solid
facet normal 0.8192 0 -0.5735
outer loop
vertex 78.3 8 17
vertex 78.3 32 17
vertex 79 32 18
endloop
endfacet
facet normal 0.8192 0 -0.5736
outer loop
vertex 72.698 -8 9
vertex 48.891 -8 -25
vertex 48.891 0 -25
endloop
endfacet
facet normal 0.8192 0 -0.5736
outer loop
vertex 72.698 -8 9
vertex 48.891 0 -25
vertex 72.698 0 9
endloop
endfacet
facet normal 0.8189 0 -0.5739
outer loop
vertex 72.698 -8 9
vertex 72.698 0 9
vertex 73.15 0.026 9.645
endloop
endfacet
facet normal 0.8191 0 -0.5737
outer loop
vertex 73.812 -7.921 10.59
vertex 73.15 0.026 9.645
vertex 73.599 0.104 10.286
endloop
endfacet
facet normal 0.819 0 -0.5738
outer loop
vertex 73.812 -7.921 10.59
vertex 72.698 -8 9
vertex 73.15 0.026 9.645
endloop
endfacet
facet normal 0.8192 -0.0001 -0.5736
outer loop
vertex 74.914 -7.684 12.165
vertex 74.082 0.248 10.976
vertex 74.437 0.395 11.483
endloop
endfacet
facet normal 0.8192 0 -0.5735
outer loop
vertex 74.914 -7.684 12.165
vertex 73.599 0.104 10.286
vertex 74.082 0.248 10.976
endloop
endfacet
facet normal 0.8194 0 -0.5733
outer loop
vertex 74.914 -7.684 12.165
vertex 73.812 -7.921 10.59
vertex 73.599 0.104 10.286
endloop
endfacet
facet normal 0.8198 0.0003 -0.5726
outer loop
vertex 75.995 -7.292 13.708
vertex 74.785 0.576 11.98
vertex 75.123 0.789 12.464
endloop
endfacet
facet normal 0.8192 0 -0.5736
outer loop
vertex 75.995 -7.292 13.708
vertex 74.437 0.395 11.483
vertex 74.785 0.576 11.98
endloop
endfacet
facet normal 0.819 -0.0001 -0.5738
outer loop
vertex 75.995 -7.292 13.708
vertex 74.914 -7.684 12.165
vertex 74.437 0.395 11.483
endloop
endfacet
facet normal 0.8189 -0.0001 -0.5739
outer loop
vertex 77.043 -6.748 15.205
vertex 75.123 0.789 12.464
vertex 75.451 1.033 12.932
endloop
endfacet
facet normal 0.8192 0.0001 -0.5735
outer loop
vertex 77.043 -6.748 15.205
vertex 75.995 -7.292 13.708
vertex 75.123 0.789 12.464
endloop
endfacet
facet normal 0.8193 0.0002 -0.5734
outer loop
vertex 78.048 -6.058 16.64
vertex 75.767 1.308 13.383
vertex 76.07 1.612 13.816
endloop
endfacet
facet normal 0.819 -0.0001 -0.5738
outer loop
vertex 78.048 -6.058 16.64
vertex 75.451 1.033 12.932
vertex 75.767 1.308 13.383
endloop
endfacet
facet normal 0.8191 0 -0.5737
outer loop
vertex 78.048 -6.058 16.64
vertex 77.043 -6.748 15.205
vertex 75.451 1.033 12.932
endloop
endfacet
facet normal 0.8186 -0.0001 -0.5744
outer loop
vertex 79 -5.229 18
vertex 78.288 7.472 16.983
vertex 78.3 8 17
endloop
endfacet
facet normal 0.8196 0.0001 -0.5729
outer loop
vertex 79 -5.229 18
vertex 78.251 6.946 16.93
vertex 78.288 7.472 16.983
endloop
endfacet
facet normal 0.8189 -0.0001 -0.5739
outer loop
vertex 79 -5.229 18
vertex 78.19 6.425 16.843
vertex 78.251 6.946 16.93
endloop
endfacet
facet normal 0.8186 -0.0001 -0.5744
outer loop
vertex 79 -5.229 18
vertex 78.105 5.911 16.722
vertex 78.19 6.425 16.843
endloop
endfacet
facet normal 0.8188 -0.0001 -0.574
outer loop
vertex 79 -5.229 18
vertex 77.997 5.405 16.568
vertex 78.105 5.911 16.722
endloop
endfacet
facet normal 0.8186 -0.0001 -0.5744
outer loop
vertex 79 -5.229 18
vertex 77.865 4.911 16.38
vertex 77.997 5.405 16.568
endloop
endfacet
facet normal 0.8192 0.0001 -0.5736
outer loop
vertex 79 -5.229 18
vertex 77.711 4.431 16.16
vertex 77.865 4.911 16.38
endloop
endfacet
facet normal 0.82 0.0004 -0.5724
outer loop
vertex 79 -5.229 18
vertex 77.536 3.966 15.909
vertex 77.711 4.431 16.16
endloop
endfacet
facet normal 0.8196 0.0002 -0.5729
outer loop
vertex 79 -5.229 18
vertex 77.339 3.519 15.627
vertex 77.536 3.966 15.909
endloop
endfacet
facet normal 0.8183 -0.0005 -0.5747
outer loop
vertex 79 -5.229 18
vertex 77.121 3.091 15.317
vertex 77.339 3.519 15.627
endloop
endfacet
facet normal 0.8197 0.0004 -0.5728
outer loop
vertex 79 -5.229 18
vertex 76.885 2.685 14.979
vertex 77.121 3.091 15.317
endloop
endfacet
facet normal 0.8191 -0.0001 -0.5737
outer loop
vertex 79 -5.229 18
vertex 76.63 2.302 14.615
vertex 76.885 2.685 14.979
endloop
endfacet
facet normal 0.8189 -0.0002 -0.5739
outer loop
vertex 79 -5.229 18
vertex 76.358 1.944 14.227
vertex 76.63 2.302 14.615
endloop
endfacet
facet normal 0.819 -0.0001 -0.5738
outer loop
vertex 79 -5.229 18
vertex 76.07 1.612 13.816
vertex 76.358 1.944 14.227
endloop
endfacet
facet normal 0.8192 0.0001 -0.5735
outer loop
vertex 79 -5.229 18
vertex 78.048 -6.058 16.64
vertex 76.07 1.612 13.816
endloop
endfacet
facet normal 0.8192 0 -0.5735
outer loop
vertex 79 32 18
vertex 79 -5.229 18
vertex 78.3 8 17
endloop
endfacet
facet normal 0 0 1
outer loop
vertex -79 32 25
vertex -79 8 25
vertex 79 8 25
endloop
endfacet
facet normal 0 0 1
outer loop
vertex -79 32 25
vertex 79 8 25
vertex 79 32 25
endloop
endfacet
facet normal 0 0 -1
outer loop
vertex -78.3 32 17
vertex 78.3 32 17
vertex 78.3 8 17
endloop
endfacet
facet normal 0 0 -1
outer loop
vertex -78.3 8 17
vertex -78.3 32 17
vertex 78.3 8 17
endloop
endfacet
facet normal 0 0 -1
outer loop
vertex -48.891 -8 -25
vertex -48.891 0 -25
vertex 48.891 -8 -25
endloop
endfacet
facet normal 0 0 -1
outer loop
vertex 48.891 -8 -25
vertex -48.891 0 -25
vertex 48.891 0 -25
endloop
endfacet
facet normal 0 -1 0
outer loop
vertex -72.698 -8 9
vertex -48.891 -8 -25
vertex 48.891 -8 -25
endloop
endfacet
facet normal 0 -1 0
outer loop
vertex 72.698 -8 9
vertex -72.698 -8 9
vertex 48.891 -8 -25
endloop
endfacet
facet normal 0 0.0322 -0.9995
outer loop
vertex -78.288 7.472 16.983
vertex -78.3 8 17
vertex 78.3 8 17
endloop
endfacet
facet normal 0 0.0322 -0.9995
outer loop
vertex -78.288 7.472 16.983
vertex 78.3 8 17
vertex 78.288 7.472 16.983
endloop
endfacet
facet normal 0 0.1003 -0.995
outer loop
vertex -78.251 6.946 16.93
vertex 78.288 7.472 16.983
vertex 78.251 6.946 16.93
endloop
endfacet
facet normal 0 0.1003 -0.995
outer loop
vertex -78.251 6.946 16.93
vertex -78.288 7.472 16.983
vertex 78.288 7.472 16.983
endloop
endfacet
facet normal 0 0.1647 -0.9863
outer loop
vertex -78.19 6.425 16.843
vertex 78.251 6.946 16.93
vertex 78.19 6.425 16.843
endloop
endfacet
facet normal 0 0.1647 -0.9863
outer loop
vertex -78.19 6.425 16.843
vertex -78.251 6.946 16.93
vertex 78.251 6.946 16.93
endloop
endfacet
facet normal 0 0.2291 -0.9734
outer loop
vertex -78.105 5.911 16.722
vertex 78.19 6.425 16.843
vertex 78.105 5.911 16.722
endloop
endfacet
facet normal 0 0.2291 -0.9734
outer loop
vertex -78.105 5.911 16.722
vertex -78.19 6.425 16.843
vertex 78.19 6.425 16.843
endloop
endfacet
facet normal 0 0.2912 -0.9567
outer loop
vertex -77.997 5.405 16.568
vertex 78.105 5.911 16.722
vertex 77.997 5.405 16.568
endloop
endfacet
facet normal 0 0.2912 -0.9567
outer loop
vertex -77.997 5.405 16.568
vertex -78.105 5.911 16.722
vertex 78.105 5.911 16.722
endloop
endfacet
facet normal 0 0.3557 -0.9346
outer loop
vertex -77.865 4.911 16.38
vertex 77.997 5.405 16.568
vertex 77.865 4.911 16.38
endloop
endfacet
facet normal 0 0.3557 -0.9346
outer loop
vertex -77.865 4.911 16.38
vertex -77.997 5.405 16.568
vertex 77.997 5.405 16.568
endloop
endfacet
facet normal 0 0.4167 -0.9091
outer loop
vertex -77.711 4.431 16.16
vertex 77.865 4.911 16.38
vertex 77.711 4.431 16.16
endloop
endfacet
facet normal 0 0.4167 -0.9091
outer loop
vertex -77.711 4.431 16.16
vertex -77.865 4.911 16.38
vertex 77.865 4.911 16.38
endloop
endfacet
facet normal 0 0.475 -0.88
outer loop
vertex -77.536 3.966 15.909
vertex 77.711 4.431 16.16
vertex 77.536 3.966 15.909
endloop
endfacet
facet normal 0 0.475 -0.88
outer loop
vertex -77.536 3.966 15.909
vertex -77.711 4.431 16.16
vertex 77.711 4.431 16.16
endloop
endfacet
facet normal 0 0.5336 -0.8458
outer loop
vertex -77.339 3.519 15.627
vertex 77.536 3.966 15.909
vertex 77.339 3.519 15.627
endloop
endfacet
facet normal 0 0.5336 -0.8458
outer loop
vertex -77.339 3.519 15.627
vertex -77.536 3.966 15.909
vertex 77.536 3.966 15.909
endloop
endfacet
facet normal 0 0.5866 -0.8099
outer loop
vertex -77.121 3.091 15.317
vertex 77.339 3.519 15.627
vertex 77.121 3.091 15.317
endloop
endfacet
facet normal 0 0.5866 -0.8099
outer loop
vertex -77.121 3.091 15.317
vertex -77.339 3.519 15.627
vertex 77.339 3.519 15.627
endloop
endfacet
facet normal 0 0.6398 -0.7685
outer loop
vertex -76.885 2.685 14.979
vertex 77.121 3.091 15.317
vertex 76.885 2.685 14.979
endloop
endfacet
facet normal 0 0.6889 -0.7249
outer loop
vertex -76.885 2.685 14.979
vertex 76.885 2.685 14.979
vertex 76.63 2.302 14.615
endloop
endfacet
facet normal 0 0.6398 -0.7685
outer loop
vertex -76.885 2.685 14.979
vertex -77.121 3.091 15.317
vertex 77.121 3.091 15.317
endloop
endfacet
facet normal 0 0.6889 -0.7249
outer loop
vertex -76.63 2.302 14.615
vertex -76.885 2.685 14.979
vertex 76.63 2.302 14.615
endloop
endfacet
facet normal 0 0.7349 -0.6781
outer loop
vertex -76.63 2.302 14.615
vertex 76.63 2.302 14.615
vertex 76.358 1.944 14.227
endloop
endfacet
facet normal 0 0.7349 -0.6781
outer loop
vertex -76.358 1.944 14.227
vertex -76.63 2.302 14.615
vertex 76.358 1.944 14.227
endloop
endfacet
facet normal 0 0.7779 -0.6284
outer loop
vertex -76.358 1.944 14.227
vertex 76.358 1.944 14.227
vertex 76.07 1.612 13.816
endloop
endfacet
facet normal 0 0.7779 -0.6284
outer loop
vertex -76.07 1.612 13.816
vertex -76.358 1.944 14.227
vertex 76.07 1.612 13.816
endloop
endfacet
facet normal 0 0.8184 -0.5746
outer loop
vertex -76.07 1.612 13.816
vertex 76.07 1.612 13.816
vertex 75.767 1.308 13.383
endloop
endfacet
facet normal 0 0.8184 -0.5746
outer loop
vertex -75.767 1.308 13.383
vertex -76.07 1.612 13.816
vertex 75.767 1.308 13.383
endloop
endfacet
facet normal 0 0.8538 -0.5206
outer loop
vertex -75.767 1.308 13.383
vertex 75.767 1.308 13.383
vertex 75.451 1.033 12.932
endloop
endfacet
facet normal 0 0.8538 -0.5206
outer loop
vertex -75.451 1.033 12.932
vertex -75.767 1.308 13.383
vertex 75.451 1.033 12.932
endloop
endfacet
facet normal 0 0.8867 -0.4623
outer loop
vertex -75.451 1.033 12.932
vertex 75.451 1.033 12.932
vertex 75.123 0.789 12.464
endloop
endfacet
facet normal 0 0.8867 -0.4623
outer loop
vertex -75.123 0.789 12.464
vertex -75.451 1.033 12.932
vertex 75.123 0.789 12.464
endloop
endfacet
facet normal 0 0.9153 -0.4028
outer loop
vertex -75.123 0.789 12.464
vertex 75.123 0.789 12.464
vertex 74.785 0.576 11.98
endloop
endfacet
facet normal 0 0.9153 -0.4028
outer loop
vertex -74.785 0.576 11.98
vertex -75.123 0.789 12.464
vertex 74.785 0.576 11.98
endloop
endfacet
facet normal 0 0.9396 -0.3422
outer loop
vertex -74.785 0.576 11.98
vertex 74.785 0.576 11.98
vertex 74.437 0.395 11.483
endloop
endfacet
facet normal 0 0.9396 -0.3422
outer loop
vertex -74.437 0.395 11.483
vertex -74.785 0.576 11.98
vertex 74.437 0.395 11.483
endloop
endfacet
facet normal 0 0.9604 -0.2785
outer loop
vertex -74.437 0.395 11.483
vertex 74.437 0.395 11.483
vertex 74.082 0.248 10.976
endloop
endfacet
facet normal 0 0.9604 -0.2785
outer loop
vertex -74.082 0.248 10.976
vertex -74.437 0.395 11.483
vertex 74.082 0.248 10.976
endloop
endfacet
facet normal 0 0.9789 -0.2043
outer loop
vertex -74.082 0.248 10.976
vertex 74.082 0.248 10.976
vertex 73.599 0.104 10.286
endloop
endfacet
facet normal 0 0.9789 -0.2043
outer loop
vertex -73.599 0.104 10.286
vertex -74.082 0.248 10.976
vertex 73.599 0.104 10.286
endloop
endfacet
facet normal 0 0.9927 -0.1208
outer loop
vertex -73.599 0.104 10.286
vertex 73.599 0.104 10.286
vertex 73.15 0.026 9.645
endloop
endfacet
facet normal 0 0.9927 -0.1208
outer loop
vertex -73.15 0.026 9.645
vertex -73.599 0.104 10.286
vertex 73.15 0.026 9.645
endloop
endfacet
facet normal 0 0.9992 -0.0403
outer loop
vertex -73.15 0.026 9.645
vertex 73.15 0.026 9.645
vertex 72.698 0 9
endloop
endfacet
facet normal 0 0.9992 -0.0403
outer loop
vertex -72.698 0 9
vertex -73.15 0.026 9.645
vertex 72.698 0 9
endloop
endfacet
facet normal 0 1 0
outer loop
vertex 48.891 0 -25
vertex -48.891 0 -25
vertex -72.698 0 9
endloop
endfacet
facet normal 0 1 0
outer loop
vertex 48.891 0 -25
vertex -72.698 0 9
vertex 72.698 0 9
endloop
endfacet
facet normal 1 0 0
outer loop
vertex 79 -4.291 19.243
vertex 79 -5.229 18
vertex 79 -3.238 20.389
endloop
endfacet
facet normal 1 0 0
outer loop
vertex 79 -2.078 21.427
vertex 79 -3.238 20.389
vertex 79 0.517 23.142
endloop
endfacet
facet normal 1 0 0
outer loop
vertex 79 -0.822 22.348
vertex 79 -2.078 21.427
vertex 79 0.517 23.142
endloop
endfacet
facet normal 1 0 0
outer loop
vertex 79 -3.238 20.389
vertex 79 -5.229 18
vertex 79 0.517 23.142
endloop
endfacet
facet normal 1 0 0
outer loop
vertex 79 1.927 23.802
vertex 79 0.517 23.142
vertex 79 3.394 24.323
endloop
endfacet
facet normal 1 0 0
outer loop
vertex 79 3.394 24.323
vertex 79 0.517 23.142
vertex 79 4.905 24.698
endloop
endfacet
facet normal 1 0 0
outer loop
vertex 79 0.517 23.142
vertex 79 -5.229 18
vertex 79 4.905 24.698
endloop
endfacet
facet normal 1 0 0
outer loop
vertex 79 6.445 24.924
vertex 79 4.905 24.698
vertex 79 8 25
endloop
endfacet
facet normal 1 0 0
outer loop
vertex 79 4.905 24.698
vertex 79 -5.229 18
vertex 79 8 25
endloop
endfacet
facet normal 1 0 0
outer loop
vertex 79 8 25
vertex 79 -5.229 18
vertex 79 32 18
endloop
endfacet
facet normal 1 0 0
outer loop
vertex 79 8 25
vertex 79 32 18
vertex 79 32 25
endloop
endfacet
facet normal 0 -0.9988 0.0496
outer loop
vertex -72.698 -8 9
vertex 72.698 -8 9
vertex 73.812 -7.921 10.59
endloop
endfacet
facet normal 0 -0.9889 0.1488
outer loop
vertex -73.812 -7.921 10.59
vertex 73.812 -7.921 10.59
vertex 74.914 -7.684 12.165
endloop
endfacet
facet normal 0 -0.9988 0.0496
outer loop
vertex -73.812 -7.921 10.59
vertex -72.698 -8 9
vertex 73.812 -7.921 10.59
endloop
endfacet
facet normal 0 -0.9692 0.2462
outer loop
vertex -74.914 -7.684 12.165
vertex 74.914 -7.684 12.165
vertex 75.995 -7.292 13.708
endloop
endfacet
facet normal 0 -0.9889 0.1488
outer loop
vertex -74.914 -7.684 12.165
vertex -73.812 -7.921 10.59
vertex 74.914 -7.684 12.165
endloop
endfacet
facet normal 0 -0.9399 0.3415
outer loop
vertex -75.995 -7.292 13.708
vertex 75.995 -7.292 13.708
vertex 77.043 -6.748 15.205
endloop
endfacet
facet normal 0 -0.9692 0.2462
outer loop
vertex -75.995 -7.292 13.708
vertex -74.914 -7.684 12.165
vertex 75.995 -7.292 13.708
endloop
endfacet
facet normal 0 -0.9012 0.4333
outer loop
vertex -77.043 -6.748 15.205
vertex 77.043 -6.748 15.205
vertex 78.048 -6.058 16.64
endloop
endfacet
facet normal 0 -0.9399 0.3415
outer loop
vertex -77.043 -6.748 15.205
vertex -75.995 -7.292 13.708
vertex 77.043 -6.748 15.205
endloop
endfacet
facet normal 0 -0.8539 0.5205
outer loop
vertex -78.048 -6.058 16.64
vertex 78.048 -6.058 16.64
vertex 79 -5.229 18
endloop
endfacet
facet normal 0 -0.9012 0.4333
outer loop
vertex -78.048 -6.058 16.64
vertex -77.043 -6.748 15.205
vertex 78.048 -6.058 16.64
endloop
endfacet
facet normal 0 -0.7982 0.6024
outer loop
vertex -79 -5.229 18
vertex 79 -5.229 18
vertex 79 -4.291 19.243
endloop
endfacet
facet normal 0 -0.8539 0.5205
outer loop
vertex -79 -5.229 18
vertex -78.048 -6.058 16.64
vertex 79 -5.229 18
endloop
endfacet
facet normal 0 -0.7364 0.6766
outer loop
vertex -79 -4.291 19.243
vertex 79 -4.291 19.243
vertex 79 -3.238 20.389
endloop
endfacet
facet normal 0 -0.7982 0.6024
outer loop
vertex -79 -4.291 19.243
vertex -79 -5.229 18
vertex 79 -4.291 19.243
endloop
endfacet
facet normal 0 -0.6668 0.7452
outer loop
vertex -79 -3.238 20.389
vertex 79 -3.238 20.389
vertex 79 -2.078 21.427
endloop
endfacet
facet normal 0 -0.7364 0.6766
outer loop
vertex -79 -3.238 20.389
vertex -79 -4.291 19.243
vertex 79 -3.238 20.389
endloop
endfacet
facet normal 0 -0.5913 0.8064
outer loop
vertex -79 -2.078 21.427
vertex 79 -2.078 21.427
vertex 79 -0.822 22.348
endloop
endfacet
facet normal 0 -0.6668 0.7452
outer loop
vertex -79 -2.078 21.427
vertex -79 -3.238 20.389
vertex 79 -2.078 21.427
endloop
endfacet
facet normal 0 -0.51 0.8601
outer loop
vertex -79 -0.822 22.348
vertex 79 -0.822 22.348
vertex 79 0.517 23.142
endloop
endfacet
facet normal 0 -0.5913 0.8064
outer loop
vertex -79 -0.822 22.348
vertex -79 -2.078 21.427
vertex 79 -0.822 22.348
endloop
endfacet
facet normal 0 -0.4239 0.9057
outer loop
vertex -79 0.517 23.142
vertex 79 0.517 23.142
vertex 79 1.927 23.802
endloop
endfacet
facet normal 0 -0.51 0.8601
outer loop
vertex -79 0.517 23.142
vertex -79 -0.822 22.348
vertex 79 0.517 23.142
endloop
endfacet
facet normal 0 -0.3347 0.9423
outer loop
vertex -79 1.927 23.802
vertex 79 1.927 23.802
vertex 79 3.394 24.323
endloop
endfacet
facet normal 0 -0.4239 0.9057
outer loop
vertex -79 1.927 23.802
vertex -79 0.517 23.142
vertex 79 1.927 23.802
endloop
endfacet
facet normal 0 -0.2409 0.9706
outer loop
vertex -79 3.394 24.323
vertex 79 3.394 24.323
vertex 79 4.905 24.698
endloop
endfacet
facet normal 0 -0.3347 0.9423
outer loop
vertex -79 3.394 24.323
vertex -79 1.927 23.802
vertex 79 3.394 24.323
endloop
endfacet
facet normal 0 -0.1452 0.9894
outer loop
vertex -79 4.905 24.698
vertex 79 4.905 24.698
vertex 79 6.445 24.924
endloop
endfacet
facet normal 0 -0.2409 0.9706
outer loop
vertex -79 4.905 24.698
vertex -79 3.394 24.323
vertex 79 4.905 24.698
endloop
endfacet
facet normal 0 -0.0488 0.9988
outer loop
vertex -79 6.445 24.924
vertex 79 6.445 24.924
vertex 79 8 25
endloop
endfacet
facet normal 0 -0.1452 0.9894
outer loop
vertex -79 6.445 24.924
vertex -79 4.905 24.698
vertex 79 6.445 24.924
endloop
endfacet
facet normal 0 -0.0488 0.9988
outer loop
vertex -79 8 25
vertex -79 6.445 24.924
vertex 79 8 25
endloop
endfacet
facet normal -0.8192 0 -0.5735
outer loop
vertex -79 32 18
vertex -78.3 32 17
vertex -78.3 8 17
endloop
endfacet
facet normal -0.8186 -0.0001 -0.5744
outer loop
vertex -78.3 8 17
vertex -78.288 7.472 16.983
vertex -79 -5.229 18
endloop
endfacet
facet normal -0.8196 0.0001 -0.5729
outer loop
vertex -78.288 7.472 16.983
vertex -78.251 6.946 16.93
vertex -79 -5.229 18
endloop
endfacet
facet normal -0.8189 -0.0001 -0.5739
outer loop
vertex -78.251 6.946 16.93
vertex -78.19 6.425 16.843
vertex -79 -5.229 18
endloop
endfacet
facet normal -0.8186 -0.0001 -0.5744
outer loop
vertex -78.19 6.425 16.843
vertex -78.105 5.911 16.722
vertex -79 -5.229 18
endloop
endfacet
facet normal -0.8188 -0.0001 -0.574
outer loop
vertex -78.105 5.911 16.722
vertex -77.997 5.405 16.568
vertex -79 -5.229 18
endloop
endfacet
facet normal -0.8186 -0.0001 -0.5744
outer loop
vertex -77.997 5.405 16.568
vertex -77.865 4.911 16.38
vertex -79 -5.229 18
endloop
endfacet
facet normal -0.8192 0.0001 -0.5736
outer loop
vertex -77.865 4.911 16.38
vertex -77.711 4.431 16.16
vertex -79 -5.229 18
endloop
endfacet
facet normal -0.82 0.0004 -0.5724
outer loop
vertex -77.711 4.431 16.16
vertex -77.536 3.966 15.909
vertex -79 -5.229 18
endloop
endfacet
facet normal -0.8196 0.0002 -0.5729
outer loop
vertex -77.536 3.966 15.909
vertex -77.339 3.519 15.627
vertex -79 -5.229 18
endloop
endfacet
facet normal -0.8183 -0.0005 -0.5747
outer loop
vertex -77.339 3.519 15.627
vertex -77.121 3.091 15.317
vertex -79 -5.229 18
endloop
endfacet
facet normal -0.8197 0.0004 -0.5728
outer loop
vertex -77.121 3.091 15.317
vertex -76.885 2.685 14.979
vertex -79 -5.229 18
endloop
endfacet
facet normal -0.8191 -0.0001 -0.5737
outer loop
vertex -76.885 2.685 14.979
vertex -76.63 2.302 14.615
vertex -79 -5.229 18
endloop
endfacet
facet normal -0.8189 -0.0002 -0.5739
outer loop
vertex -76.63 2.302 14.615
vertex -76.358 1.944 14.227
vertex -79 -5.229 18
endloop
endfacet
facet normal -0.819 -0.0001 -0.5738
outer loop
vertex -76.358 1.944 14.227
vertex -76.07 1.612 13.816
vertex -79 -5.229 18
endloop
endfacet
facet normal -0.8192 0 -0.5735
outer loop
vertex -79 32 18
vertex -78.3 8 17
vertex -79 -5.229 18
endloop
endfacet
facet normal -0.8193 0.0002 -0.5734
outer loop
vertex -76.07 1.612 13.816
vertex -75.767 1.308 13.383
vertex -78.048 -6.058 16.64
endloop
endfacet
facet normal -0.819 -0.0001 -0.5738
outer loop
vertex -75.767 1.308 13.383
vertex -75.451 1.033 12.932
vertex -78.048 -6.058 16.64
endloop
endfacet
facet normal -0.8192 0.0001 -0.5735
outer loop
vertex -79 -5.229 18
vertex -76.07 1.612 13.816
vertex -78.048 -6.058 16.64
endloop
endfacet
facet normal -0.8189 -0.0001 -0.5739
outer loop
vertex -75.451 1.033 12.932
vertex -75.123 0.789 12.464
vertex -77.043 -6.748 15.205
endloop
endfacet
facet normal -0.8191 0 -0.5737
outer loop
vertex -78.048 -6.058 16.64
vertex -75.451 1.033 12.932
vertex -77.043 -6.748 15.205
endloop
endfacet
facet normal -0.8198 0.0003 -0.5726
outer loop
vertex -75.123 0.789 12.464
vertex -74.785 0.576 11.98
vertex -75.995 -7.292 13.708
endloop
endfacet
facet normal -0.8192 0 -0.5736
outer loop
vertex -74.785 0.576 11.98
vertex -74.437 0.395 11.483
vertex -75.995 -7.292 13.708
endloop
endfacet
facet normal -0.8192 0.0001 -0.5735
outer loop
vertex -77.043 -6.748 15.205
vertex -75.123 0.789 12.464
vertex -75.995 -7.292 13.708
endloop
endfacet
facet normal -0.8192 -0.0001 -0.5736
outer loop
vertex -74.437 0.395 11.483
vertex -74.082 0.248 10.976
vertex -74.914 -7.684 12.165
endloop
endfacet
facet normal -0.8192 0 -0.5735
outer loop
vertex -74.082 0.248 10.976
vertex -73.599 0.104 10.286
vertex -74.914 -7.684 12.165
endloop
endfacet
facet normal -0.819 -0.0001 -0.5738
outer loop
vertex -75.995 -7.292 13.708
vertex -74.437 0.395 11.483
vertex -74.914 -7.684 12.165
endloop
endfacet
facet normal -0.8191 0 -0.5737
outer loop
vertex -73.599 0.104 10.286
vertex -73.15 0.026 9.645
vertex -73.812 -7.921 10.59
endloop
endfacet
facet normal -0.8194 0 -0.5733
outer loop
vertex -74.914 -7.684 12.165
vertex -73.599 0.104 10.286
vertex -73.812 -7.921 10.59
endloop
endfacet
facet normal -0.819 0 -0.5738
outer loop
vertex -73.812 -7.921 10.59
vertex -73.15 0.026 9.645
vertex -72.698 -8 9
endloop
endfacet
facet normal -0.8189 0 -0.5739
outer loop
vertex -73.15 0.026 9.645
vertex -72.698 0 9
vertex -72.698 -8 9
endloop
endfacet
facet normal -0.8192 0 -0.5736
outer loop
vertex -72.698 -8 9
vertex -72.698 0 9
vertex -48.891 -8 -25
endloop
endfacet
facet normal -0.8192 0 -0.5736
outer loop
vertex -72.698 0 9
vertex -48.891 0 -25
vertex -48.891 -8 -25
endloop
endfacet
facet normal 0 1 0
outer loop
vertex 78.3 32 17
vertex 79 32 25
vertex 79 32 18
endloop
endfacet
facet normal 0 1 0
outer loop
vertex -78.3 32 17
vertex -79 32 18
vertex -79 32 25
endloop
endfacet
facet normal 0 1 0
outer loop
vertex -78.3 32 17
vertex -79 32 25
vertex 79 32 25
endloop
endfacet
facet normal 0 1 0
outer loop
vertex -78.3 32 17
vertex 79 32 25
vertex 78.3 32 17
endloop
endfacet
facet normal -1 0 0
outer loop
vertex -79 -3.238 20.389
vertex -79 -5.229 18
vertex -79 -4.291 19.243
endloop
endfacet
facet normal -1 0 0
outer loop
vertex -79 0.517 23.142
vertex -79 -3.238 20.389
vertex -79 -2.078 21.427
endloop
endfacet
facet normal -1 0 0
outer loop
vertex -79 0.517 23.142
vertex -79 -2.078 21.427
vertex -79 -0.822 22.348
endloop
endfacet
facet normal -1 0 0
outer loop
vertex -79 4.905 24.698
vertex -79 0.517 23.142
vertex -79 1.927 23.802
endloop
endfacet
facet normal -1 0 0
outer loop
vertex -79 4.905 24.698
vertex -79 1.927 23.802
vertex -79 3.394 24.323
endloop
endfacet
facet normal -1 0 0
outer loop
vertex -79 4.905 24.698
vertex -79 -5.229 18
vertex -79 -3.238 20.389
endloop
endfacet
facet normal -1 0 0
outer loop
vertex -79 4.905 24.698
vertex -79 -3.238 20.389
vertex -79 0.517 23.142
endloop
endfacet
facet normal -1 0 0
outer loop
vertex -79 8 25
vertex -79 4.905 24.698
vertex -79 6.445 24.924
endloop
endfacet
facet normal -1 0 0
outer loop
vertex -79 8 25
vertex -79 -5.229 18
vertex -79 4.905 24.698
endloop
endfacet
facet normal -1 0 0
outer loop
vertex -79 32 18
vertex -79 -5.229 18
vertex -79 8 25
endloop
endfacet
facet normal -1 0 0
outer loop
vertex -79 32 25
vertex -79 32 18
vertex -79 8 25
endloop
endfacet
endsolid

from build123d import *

# Parameters (mm, degrees)
SKETCH1_W                    = 158
SKETCH1_H                    = 50
BASE_FLANGE1_DEPTH           = 8
EDGE_FLANGE1_STRIP_W         = 48
EDGE_FLANGE1_STRIP_H         = 8
EDGE_FLANGE1_STRIP_CUT_DEPTH = 158
EDGE_FLANGE1_DEPTH           = 158
CHAMFER1_SIZE                = 43
CHAMFER1_SIZE2               = 30.108924143
MIRROR2_START                = 54.388635645
MIRROR2_OUTLINE_W            = 56
MIRROR2_OUTLINE_H            = 41
MIRROR2_DEPTH                = 24.663786763


# Read off the part's stored shape, not the designer's step: Mirror2
# Sheet-metal steps are written as plain solids
with BuildPart() as part:
    # Sketch1 → Base-Flange1 (new body)
    with BuildSketch(Plane(origin=(0, 0, 0), x_dir=(1, 0, 0), z_dir=(0, 1, 0))):
        Rectangle(SKETCH1_W, SKETCH1_H)
    extrude(amount=-BASE_FLANGE1_DEPTH)

    # Edge-Flange1 strip (across the edge) → Edge-Flange1 strip cut (cut)
    with BuildSketch(Plane(origin=(-79, 0, 25), x_dir=(0, 0, -1), z_dir=(1, 0, 0))):
        with Locations((-8, -4)):
            Rectangle(EDGE_FLANGE1_STRIP_W, EDGE_FLANGE1_STRIP_H)
    extrude(amount=EDGE_FLANGE1_STRIP_CUT_DEPTH, mode=Mode.SUBTRACT)

    # Edge-Flange1 section (across the edge) → Edge-Flange1 (add)
    with BuildSketch(Plane(origin=(-79, 0, 25), x_dir=(0, 0, -1), z_dir=(1, 0, 0))):
        with BuildLine():
            Line((0, 8), (0, 32))
            Line((0, 32), (8, 32))
            Line((8, 32), (8, 8))
            ThreePointArc((8, 8), (10.343145751, 2.343145751), (16, 0))
            Line((16, 0), (16, -8))
            ThreePointArc((16, -8), (4.686291501, -3.313708499), (0, 8))
        make_face()
    extrude(amount=EDGE_FLANGE1_DEPTH)

    # Chamfer1
    chamfer1_edges = [part.edges().sort_by_distance(p)[0] for p in [
        (-79, -4, -25),
    ]]
    chamfer1_side = [part.faces().sort_by_distance(p)[0] for p in [
        (-79, -0.640312424, -8),
    ]]
    chamfer(chamfer1_edges, length=CHAMFER1_SIZE, length2=CHAMFER1_SIZE2, reference=chamfer1_side[0])

    # Mirror2 outline → Mirror2 (cut)
    with BuildSketch(Plane(origin=(0, 0, 0), x_dir=(0.5735764363510512, 0, 0.8191520442889882), z_dir=(0.8191520442889882, 0, -0.5735764363510512)).offset(MIRROR2_START)):
        with Locations((34, -12.5)):
            Rectangle(MIRROR2_OUTLINE_W, MIRROR2_OUTLINE_H)
    extrude(amount=MIRROR2_DEPTH, mode=Mode.SUBTRACT)


solid = part.part
